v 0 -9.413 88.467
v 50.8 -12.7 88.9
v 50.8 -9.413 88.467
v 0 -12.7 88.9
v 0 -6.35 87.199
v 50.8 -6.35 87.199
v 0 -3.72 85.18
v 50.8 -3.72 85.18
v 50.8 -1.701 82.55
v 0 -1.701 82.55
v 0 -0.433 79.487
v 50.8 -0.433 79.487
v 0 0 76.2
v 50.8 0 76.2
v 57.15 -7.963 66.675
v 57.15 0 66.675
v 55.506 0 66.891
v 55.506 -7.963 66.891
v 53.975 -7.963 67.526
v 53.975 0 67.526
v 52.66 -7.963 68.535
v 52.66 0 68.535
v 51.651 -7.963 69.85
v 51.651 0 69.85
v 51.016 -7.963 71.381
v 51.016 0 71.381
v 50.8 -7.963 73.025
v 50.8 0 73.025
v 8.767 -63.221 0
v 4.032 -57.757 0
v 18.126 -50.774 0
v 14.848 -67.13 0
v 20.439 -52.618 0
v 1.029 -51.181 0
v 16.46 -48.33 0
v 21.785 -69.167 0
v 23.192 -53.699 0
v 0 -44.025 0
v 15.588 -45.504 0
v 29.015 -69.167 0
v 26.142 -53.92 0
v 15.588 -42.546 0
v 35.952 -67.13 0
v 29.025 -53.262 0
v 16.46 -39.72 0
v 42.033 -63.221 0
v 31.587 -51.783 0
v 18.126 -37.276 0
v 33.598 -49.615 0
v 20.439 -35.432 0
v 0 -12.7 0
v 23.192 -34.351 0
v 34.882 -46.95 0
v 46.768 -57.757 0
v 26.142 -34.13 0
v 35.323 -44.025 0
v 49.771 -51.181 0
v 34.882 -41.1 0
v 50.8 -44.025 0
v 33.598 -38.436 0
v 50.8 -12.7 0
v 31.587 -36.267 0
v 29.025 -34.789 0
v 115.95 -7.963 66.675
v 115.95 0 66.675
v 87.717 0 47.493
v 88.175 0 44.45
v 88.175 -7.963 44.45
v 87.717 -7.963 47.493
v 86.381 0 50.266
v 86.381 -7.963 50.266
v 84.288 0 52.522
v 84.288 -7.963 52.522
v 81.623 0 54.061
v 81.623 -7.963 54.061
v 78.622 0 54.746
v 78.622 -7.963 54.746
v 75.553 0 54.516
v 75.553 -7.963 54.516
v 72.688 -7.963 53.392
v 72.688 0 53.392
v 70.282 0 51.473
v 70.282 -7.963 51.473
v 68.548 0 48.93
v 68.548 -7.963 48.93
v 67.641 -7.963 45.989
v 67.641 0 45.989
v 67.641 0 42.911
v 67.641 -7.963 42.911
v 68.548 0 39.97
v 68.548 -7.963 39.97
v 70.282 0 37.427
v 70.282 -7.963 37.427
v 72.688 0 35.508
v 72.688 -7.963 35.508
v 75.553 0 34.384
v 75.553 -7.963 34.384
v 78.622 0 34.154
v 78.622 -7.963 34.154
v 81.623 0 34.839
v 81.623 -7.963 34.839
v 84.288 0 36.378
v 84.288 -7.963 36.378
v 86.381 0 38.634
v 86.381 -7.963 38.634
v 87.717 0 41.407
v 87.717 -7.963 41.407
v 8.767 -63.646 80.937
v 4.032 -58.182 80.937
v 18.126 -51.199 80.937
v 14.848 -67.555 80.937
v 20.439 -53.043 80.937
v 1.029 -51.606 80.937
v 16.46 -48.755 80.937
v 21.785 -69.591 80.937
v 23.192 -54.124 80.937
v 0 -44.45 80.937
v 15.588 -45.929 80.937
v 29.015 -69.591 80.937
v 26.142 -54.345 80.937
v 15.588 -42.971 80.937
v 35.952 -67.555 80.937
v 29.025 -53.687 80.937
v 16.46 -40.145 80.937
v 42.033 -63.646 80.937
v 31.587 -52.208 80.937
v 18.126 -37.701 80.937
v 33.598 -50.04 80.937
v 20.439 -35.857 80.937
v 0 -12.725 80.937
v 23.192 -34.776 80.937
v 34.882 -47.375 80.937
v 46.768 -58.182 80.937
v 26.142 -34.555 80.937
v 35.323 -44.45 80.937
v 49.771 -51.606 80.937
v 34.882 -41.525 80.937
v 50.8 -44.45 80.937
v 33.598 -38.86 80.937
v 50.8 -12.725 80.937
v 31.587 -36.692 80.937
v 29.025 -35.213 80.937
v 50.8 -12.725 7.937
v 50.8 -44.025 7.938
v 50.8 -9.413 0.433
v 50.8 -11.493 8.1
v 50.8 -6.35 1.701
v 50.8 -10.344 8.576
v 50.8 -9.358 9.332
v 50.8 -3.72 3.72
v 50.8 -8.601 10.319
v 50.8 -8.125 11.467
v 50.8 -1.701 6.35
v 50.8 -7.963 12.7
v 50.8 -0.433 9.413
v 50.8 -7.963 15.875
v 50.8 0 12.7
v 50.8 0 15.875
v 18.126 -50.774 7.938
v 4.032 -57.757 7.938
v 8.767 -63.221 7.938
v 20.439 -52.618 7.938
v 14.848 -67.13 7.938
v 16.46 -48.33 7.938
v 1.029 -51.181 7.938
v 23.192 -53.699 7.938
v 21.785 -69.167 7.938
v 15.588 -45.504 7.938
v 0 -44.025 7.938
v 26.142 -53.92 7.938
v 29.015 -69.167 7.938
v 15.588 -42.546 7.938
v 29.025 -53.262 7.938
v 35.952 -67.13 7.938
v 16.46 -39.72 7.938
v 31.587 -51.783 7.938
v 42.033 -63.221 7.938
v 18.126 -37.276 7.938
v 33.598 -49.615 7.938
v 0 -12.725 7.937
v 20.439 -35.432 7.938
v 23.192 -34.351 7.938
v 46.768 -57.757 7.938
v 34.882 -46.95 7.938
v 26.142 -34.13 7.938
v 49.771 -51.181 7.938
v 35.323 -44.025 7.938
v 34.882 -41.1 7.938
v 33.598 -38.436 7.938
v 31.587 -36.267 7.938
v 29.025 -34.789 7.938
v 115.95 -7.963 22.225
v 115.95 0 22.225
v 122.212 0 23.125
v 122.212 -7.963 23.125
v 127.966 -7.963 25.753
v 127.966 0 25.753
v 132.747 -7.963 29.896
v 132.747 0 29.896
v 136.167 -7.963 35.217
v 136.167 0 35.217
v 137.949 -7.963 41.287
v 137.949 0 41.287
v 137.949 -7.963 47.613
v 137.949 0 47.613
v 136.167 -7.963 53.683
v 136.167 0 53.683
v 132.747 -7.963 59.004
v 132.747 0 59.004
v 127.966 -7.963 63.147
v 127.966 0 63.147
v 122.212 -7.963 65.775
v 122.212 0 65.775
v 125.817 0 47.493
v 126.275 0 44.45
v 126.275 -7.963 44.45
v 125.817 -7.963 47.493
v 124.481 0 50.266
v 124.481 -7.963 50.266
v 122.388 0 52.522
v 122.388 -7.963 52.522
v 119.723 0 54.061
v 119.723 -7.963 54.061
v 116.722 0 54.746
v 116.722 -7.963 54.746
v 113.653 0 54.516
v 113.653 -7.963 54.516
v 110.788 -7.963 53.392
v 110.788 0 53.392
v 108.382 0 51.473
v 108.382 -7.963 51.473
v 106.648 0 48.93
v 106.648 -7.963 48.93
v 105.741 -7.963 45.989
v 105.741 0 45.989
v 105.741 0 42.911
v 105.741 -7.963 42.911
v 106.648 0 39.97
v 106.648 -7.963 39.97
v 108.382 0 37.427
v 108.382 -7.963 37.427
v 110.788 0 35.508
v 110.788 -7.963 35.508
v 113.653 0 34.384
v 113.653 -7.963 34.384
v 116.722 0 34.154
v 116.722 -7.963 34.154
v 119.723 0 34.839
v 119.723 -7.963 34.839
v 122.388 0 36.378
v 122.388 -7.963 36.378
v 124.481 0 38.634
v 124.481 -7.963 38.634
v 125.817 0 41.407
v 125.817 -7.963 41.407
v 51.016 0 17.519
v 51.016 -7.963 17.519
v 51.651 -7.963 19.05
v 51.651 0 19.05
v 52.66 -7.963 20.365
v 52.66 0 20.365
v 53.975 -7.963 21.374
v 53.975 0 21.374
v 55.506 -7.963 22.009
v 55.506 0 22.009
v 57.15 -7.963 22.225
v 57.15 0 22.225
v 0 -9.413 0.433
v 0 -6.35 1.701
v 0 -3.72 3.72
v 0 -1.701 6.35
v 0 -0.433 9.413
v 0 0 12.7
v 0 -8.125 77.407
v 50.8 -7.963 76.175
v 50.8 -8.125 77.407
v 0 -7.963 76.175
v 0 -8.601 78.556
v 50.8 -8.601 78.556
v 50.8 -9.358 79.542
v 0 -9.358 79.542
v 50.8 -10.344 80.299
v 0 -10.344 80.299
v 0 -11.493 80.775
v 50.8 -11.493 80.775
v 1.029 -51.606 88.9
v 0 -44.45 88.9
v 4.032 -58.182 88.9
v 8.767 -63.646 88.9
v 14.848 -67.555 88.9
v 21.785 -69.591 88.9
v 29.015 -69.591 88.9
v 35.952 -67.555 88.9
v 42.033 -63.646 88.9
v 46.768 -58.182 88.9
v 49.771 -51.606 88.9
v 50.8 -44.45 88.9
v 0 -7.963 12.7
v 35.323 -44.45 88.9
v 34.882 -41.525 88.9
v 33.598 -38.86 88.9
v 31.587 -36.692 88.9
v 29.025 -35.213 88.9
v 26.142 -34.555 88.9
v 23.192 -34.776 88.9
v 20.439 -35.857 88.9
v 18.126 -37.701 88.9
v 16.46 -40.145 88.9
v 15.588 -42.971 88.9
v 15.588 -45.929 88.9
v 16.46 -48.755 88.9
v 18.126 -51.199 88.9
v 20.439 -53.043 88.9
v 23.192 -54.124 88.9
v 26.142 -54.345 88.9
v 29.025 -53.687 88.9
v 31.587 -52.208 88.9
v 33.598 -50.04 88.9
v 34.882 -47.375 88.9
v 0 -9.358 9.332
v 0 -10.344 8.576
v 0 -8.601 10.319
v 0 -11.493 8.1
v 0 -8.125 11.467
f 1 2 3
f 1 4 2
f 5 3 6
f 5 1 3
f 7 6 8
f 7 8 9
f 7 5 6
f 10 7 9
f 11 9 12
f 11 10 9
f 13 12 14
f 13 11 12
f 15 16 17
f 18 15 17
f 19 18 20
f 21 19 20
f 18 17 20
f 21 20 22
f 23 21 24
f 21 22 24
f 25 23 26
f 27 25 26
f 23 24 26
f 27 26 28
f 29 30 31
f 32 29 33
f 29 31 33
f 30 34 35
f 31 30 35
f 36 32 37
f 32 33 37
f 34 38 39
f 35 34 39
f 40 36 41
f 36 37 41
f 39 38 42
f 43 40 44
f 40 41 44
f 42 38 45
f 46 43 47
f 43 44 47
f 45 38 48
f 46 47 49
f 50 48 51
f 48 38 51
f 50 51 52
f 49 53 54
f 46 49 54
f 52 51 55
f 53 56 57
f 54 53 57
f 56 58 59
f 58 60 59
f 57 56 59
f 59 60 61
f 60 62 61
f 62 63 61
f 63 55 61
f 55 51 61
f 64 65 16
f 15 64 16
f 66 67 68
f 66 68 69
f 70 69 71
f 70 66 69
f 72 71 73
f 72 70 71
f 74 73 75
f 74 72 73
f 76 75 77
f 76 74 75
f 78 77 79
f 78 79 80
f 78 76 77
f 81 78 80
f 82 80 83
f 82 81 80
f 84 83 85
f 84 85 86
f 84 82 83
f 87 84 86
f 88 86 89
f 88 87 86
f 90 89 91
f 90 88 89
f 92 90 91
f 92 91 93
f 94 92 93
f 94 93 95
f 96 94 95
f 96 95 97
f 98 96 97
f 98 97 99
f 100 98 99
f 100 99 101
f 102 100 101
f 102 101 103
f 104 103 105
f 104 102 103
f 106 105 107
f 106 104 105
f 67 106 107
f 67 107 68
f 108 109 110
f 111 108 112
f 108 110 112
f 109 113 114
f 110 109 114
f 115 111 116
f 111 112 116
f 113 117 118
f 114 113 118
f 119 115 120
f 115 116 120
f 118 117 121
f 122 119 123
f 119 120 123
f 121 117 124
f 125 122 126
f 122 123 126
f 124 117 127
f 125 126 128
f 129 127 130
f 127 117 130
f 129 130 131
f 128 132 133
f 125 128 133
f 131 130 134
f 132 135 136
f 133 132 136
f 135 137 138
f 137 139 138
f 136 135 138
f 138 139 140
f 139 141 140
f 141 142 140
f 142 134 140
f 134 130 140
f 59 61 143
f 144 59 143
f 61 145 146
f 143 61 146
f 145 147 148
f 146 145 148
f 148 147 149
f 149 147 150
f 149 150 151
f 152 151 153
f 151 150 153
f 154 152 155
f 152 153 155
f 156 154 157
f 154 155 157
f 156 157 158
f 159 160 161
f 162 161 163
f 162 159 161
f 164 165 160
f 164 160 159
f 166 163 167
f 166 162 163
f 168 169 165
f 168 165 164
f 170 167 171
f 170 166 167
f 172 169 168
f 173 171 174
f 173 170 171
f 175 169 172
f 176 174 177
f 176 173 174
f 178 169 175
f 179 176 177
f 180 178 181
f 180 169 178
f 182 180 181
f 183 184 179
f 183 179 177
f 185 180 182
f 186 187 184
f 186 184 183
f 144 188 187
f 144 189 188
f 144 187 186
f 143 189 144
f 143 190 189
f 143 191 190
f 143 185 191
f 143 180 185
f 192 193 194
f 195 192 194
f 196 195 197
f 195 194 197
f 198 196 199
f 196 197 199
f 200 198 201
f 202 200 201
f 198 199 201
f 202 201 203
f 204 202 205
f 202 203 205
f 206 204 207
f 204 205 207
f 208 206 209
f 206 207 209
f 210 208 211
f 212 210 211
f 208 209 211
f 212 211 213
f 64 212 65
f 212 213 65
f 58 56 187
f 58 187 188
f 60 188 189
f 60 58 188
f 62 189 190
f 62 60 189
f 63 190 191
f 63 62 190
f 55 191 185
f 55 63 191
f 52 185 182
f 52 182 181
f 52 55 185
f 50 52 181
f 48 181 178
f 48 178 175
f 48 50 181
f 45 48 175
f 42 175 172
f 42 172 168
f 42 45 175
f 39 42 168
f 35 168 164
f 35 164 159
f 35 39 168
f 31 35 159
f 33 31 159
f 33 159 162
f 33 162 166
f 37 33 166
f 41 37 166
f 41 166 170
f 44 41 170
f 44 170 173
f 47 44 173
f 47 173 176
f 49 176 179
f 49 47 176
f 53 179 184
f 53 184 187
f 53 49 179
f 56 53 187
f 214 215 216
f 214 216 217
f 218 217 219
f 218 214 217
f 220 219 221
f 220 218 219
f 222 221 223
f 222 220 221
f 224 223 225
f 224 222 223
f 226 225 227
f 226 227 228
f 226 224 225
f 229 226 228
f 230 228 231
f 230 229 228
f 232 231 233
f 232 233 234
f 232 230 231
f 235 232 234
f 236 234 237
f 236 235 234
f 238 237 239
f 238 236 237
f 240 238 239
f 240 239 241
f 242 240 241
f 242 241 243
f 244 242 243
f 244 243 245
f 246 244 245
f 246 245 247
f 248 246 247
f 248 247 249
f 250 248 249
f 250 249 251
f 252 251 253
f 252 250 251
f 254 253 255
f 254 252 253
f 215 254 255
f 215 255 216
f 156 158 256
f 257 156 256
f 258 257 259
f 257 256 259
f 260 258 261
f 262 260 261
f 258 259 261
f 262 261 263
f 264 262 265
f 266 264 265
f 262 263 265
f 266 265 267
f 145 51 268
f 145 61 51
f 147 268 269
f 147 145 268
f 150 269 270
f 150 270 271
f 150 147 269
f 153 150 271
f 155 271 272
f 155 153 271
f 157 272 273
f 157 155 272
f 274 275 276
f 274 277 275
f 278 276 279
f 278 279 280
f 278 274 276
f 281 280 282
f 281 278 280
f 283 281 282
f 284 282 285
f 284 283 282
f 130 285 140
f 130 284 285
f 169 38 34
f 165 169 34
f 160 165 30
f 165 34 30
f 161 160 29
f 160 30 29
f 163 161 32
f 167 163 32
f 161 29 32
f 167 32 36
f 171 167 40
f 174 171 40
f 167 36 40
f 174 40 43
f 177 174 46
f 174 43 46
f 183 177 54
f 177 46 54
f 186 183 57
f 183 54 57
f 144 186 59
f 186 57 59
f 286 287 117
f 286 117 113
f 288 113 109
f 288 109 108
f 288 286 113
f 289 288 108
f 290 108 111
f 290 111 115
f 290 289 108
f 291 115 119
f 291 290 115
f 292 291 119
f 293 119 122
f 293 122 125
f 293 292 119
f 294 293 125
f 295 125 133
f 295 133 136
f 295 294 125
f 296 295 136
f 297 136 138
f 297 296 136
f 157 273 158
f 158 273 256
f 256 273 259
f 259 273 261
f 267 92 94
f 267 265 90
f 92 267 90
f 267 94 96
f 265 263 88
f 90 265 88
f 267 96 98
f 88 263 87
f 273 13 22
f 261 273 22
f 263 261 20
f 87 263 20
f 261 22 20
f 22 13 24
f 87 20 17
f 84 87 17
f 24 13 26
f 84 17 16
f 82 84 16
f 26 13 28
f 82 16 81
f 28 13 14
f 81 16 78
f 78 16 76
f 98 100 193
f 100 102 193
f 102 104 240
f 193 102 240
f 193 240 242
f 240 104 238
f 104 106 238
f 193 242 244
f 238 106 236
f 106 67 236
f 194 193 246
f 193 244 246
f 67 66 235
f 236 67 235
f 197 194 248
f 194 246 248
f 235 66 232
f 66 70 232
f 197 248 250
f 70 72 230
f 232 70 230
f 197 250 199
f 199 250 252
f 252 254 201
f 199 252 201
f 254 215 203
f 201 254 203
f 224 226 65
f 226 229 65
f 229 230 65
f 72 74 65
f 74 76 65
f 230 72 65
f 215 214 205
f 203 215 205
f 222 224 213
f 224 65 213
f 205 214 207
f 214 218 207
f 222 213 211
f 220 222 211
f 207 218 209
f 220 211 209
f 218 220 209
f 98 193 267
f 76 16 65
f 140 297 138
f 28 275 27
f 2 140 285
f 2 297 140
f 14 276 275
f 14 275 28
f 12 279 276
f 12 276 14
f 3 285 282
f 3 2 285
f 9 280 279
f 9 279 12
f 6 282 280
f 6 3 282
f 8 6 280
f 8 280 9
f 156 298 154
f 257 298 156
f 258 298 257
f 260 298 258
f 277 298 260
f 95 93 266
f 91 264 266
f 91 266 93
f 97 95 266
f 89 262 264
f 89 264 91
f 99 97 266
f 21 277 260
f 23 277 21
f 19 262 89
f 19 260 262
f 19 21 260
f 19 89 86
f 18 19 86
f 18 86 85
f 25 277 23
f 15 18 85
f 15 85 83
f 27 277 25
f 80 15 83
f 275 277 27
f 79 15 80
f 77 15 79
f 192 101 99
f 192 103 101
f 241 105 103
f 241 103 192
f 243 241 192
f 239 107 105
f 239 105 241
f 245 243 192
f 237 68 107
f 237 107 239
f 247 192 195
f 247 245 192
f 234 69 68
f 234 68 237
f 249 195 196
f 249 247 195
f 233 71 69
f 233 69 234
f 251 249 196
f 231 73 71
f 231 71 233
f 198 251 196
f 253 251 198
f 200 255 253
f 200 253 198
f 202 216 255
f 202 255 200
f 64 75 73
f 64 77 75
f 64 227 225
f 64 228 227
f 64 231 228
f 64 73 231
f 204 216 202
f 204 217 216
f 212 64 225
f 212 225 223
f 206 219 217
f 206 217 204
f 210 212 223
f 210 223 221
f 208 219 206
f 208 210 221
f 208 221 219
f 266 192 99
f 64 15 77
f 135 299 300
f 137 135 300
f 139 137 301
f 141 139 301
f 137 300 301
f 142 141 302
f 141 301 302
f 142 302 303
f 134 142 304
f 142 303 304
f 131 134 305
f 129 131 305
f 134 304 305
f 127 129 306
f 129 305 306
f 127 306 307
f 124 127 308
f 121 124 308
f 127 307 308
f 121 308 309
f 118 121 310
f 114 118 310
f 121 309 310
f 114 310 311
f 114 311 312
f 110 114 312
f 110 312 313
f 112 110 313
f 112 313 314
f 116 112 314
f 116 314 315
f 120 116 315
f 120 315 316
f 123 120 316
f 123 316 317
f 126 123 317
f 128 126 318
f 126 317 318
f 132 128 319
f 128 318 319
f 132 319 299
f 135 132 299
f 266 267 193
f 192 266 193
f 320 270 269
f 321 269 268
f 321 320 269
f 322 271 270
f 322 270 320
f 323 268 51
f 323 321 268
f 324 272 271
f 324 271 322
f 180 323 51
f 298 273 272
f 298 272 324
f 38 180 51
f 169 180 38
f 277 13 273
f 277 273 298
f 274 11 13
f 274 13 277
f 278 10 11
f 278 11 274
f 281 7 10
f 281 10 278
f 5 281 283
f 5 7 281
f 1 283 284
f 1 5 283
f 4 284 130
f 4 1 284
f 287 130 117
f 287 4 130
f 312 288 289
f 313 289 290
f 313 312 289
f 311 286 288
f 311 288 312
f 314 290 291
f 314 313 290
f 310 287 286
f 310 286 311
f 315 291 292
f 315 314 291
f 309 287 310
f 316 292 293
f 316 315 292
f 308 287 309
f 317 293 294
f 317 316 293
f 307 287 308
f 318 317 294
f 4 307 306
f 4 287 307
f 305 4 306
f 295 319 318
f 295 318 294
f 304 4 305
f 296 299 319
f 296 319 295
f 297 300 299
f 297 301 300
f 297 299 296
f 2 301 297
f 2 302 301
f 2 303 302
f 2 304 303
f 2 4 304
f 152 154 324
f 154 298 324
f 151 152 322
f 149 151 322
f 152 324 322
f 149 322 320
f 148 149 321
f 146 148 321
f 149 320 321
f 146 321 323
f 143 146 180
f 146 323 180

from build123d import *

# Parameters (mm, degrees)
F0_R     = 10.3251
F1_DEPTH = 7.9629
F2_R     = 9.92251
F3_DEPTH = 7.9375
F4_R     = 9.92251
F5_DEPTH = 7.9629
F6_R     = 12.7
F7_R     = 4.7625


with BuildPart() as f1:
    # F0 (on Front) → F1 (new body)
    with BuildSketch(Plane.XZ):
        with BuildLine():
            Line((0, 88.9), (0, 0))
            Line((0, 0), (50.8, 0))
            Line((50.8, 0), (50.8, 15.875))
            ThreePointArc((50.8, 15.875), (52.6598719395, 20.3651280605), (57.15, 22.225))
            Line((57.15, 22.225), (65.1503875852, 22.225))
            Line((65.1503875852, 22.225), (115.9503875852, 22.225))
            ThreePointArc((115.9503875852, 22.225), (138.1753875852, 44.45), (115.9503875852, 66.675))
            Line((115.9503875852, 66.675), (65.1503875852, 66.675))
            Line((65.1503875852, 66.675), (57.15, 66.675))
            ThreePointArc((57.15, 66.675), (52.6598719395, 68.5348719395), (50.8, 73.025))
            Line((50.8, 73.025), (50.8, 88.9))
            Line((50.8, 88.9), (0, 88.9))
        make_face()
        with Locations((77.8503875852, 44.45)):
            Circle(F0_R, mode=Mode.SUBTRACT)
        with Locations((115.9503875852, 44.45)):
            Circle(F0_R, mode=Mode.SUBTRACT)
    extrude(amount=F1_DEPTH)

    # F2 (on Top) → F3 (join)
    with BuildSketch(Plane.XY):
        with BuildLine():
            Line((0, 0), (0, -44.0251193941))
            ThreePointArc((0, -44.0251193941), (25.4, -69.4251193941), (50.8, -44.0251193941))
            Line((50.8, -44.0251193941), (50.8, 0))
            Line((50.8, 0), (0, 0))
        make_face()
        with Locations((25.4, -44.0251193941)):
            Circle(F2_R, mode=Mode.SUBTRACT)
    extrude(amount=F3_DEPTH)

    # F4 (on face) → F5 (join)
    with BuildSketch(Plane.XY.offset(88.9)):
        with BuildLine():
            Line((50.8, -44.45), (50.8, -7.9629))
            Line((50.8, -7.9629), (0, -7.9629))
            Line((0, -7.9629), (0, -44.45))
            ThreePointArc((0, -44.45), (25.4, -69.85), (50.8, -44.45))
        make_face()
        with Locations((25.4, -44.45)):
            Circle(F4_R, mode=Mode.SUBTRACT)
    extrude(amount=-F5_DEPTH)

    # F6
    f6_edges = [f1.edges().sort_by_distance(p)[0] for p in [
        (25.4, 0, 0),
        (25.4, 0, 88.9),
    ]]
    fillet(f6_edges, radius=F6_R)

    # F7
    f7_edges = [f1.edges().sort_by_distance(p)[0] for p in [
        (25.4, -7.9629, 7.9375),
        (25.4, -7.9629, 80.9371),
    ]]
    fillet(f7_edges, radius=F7_R)


solid = f1.part
